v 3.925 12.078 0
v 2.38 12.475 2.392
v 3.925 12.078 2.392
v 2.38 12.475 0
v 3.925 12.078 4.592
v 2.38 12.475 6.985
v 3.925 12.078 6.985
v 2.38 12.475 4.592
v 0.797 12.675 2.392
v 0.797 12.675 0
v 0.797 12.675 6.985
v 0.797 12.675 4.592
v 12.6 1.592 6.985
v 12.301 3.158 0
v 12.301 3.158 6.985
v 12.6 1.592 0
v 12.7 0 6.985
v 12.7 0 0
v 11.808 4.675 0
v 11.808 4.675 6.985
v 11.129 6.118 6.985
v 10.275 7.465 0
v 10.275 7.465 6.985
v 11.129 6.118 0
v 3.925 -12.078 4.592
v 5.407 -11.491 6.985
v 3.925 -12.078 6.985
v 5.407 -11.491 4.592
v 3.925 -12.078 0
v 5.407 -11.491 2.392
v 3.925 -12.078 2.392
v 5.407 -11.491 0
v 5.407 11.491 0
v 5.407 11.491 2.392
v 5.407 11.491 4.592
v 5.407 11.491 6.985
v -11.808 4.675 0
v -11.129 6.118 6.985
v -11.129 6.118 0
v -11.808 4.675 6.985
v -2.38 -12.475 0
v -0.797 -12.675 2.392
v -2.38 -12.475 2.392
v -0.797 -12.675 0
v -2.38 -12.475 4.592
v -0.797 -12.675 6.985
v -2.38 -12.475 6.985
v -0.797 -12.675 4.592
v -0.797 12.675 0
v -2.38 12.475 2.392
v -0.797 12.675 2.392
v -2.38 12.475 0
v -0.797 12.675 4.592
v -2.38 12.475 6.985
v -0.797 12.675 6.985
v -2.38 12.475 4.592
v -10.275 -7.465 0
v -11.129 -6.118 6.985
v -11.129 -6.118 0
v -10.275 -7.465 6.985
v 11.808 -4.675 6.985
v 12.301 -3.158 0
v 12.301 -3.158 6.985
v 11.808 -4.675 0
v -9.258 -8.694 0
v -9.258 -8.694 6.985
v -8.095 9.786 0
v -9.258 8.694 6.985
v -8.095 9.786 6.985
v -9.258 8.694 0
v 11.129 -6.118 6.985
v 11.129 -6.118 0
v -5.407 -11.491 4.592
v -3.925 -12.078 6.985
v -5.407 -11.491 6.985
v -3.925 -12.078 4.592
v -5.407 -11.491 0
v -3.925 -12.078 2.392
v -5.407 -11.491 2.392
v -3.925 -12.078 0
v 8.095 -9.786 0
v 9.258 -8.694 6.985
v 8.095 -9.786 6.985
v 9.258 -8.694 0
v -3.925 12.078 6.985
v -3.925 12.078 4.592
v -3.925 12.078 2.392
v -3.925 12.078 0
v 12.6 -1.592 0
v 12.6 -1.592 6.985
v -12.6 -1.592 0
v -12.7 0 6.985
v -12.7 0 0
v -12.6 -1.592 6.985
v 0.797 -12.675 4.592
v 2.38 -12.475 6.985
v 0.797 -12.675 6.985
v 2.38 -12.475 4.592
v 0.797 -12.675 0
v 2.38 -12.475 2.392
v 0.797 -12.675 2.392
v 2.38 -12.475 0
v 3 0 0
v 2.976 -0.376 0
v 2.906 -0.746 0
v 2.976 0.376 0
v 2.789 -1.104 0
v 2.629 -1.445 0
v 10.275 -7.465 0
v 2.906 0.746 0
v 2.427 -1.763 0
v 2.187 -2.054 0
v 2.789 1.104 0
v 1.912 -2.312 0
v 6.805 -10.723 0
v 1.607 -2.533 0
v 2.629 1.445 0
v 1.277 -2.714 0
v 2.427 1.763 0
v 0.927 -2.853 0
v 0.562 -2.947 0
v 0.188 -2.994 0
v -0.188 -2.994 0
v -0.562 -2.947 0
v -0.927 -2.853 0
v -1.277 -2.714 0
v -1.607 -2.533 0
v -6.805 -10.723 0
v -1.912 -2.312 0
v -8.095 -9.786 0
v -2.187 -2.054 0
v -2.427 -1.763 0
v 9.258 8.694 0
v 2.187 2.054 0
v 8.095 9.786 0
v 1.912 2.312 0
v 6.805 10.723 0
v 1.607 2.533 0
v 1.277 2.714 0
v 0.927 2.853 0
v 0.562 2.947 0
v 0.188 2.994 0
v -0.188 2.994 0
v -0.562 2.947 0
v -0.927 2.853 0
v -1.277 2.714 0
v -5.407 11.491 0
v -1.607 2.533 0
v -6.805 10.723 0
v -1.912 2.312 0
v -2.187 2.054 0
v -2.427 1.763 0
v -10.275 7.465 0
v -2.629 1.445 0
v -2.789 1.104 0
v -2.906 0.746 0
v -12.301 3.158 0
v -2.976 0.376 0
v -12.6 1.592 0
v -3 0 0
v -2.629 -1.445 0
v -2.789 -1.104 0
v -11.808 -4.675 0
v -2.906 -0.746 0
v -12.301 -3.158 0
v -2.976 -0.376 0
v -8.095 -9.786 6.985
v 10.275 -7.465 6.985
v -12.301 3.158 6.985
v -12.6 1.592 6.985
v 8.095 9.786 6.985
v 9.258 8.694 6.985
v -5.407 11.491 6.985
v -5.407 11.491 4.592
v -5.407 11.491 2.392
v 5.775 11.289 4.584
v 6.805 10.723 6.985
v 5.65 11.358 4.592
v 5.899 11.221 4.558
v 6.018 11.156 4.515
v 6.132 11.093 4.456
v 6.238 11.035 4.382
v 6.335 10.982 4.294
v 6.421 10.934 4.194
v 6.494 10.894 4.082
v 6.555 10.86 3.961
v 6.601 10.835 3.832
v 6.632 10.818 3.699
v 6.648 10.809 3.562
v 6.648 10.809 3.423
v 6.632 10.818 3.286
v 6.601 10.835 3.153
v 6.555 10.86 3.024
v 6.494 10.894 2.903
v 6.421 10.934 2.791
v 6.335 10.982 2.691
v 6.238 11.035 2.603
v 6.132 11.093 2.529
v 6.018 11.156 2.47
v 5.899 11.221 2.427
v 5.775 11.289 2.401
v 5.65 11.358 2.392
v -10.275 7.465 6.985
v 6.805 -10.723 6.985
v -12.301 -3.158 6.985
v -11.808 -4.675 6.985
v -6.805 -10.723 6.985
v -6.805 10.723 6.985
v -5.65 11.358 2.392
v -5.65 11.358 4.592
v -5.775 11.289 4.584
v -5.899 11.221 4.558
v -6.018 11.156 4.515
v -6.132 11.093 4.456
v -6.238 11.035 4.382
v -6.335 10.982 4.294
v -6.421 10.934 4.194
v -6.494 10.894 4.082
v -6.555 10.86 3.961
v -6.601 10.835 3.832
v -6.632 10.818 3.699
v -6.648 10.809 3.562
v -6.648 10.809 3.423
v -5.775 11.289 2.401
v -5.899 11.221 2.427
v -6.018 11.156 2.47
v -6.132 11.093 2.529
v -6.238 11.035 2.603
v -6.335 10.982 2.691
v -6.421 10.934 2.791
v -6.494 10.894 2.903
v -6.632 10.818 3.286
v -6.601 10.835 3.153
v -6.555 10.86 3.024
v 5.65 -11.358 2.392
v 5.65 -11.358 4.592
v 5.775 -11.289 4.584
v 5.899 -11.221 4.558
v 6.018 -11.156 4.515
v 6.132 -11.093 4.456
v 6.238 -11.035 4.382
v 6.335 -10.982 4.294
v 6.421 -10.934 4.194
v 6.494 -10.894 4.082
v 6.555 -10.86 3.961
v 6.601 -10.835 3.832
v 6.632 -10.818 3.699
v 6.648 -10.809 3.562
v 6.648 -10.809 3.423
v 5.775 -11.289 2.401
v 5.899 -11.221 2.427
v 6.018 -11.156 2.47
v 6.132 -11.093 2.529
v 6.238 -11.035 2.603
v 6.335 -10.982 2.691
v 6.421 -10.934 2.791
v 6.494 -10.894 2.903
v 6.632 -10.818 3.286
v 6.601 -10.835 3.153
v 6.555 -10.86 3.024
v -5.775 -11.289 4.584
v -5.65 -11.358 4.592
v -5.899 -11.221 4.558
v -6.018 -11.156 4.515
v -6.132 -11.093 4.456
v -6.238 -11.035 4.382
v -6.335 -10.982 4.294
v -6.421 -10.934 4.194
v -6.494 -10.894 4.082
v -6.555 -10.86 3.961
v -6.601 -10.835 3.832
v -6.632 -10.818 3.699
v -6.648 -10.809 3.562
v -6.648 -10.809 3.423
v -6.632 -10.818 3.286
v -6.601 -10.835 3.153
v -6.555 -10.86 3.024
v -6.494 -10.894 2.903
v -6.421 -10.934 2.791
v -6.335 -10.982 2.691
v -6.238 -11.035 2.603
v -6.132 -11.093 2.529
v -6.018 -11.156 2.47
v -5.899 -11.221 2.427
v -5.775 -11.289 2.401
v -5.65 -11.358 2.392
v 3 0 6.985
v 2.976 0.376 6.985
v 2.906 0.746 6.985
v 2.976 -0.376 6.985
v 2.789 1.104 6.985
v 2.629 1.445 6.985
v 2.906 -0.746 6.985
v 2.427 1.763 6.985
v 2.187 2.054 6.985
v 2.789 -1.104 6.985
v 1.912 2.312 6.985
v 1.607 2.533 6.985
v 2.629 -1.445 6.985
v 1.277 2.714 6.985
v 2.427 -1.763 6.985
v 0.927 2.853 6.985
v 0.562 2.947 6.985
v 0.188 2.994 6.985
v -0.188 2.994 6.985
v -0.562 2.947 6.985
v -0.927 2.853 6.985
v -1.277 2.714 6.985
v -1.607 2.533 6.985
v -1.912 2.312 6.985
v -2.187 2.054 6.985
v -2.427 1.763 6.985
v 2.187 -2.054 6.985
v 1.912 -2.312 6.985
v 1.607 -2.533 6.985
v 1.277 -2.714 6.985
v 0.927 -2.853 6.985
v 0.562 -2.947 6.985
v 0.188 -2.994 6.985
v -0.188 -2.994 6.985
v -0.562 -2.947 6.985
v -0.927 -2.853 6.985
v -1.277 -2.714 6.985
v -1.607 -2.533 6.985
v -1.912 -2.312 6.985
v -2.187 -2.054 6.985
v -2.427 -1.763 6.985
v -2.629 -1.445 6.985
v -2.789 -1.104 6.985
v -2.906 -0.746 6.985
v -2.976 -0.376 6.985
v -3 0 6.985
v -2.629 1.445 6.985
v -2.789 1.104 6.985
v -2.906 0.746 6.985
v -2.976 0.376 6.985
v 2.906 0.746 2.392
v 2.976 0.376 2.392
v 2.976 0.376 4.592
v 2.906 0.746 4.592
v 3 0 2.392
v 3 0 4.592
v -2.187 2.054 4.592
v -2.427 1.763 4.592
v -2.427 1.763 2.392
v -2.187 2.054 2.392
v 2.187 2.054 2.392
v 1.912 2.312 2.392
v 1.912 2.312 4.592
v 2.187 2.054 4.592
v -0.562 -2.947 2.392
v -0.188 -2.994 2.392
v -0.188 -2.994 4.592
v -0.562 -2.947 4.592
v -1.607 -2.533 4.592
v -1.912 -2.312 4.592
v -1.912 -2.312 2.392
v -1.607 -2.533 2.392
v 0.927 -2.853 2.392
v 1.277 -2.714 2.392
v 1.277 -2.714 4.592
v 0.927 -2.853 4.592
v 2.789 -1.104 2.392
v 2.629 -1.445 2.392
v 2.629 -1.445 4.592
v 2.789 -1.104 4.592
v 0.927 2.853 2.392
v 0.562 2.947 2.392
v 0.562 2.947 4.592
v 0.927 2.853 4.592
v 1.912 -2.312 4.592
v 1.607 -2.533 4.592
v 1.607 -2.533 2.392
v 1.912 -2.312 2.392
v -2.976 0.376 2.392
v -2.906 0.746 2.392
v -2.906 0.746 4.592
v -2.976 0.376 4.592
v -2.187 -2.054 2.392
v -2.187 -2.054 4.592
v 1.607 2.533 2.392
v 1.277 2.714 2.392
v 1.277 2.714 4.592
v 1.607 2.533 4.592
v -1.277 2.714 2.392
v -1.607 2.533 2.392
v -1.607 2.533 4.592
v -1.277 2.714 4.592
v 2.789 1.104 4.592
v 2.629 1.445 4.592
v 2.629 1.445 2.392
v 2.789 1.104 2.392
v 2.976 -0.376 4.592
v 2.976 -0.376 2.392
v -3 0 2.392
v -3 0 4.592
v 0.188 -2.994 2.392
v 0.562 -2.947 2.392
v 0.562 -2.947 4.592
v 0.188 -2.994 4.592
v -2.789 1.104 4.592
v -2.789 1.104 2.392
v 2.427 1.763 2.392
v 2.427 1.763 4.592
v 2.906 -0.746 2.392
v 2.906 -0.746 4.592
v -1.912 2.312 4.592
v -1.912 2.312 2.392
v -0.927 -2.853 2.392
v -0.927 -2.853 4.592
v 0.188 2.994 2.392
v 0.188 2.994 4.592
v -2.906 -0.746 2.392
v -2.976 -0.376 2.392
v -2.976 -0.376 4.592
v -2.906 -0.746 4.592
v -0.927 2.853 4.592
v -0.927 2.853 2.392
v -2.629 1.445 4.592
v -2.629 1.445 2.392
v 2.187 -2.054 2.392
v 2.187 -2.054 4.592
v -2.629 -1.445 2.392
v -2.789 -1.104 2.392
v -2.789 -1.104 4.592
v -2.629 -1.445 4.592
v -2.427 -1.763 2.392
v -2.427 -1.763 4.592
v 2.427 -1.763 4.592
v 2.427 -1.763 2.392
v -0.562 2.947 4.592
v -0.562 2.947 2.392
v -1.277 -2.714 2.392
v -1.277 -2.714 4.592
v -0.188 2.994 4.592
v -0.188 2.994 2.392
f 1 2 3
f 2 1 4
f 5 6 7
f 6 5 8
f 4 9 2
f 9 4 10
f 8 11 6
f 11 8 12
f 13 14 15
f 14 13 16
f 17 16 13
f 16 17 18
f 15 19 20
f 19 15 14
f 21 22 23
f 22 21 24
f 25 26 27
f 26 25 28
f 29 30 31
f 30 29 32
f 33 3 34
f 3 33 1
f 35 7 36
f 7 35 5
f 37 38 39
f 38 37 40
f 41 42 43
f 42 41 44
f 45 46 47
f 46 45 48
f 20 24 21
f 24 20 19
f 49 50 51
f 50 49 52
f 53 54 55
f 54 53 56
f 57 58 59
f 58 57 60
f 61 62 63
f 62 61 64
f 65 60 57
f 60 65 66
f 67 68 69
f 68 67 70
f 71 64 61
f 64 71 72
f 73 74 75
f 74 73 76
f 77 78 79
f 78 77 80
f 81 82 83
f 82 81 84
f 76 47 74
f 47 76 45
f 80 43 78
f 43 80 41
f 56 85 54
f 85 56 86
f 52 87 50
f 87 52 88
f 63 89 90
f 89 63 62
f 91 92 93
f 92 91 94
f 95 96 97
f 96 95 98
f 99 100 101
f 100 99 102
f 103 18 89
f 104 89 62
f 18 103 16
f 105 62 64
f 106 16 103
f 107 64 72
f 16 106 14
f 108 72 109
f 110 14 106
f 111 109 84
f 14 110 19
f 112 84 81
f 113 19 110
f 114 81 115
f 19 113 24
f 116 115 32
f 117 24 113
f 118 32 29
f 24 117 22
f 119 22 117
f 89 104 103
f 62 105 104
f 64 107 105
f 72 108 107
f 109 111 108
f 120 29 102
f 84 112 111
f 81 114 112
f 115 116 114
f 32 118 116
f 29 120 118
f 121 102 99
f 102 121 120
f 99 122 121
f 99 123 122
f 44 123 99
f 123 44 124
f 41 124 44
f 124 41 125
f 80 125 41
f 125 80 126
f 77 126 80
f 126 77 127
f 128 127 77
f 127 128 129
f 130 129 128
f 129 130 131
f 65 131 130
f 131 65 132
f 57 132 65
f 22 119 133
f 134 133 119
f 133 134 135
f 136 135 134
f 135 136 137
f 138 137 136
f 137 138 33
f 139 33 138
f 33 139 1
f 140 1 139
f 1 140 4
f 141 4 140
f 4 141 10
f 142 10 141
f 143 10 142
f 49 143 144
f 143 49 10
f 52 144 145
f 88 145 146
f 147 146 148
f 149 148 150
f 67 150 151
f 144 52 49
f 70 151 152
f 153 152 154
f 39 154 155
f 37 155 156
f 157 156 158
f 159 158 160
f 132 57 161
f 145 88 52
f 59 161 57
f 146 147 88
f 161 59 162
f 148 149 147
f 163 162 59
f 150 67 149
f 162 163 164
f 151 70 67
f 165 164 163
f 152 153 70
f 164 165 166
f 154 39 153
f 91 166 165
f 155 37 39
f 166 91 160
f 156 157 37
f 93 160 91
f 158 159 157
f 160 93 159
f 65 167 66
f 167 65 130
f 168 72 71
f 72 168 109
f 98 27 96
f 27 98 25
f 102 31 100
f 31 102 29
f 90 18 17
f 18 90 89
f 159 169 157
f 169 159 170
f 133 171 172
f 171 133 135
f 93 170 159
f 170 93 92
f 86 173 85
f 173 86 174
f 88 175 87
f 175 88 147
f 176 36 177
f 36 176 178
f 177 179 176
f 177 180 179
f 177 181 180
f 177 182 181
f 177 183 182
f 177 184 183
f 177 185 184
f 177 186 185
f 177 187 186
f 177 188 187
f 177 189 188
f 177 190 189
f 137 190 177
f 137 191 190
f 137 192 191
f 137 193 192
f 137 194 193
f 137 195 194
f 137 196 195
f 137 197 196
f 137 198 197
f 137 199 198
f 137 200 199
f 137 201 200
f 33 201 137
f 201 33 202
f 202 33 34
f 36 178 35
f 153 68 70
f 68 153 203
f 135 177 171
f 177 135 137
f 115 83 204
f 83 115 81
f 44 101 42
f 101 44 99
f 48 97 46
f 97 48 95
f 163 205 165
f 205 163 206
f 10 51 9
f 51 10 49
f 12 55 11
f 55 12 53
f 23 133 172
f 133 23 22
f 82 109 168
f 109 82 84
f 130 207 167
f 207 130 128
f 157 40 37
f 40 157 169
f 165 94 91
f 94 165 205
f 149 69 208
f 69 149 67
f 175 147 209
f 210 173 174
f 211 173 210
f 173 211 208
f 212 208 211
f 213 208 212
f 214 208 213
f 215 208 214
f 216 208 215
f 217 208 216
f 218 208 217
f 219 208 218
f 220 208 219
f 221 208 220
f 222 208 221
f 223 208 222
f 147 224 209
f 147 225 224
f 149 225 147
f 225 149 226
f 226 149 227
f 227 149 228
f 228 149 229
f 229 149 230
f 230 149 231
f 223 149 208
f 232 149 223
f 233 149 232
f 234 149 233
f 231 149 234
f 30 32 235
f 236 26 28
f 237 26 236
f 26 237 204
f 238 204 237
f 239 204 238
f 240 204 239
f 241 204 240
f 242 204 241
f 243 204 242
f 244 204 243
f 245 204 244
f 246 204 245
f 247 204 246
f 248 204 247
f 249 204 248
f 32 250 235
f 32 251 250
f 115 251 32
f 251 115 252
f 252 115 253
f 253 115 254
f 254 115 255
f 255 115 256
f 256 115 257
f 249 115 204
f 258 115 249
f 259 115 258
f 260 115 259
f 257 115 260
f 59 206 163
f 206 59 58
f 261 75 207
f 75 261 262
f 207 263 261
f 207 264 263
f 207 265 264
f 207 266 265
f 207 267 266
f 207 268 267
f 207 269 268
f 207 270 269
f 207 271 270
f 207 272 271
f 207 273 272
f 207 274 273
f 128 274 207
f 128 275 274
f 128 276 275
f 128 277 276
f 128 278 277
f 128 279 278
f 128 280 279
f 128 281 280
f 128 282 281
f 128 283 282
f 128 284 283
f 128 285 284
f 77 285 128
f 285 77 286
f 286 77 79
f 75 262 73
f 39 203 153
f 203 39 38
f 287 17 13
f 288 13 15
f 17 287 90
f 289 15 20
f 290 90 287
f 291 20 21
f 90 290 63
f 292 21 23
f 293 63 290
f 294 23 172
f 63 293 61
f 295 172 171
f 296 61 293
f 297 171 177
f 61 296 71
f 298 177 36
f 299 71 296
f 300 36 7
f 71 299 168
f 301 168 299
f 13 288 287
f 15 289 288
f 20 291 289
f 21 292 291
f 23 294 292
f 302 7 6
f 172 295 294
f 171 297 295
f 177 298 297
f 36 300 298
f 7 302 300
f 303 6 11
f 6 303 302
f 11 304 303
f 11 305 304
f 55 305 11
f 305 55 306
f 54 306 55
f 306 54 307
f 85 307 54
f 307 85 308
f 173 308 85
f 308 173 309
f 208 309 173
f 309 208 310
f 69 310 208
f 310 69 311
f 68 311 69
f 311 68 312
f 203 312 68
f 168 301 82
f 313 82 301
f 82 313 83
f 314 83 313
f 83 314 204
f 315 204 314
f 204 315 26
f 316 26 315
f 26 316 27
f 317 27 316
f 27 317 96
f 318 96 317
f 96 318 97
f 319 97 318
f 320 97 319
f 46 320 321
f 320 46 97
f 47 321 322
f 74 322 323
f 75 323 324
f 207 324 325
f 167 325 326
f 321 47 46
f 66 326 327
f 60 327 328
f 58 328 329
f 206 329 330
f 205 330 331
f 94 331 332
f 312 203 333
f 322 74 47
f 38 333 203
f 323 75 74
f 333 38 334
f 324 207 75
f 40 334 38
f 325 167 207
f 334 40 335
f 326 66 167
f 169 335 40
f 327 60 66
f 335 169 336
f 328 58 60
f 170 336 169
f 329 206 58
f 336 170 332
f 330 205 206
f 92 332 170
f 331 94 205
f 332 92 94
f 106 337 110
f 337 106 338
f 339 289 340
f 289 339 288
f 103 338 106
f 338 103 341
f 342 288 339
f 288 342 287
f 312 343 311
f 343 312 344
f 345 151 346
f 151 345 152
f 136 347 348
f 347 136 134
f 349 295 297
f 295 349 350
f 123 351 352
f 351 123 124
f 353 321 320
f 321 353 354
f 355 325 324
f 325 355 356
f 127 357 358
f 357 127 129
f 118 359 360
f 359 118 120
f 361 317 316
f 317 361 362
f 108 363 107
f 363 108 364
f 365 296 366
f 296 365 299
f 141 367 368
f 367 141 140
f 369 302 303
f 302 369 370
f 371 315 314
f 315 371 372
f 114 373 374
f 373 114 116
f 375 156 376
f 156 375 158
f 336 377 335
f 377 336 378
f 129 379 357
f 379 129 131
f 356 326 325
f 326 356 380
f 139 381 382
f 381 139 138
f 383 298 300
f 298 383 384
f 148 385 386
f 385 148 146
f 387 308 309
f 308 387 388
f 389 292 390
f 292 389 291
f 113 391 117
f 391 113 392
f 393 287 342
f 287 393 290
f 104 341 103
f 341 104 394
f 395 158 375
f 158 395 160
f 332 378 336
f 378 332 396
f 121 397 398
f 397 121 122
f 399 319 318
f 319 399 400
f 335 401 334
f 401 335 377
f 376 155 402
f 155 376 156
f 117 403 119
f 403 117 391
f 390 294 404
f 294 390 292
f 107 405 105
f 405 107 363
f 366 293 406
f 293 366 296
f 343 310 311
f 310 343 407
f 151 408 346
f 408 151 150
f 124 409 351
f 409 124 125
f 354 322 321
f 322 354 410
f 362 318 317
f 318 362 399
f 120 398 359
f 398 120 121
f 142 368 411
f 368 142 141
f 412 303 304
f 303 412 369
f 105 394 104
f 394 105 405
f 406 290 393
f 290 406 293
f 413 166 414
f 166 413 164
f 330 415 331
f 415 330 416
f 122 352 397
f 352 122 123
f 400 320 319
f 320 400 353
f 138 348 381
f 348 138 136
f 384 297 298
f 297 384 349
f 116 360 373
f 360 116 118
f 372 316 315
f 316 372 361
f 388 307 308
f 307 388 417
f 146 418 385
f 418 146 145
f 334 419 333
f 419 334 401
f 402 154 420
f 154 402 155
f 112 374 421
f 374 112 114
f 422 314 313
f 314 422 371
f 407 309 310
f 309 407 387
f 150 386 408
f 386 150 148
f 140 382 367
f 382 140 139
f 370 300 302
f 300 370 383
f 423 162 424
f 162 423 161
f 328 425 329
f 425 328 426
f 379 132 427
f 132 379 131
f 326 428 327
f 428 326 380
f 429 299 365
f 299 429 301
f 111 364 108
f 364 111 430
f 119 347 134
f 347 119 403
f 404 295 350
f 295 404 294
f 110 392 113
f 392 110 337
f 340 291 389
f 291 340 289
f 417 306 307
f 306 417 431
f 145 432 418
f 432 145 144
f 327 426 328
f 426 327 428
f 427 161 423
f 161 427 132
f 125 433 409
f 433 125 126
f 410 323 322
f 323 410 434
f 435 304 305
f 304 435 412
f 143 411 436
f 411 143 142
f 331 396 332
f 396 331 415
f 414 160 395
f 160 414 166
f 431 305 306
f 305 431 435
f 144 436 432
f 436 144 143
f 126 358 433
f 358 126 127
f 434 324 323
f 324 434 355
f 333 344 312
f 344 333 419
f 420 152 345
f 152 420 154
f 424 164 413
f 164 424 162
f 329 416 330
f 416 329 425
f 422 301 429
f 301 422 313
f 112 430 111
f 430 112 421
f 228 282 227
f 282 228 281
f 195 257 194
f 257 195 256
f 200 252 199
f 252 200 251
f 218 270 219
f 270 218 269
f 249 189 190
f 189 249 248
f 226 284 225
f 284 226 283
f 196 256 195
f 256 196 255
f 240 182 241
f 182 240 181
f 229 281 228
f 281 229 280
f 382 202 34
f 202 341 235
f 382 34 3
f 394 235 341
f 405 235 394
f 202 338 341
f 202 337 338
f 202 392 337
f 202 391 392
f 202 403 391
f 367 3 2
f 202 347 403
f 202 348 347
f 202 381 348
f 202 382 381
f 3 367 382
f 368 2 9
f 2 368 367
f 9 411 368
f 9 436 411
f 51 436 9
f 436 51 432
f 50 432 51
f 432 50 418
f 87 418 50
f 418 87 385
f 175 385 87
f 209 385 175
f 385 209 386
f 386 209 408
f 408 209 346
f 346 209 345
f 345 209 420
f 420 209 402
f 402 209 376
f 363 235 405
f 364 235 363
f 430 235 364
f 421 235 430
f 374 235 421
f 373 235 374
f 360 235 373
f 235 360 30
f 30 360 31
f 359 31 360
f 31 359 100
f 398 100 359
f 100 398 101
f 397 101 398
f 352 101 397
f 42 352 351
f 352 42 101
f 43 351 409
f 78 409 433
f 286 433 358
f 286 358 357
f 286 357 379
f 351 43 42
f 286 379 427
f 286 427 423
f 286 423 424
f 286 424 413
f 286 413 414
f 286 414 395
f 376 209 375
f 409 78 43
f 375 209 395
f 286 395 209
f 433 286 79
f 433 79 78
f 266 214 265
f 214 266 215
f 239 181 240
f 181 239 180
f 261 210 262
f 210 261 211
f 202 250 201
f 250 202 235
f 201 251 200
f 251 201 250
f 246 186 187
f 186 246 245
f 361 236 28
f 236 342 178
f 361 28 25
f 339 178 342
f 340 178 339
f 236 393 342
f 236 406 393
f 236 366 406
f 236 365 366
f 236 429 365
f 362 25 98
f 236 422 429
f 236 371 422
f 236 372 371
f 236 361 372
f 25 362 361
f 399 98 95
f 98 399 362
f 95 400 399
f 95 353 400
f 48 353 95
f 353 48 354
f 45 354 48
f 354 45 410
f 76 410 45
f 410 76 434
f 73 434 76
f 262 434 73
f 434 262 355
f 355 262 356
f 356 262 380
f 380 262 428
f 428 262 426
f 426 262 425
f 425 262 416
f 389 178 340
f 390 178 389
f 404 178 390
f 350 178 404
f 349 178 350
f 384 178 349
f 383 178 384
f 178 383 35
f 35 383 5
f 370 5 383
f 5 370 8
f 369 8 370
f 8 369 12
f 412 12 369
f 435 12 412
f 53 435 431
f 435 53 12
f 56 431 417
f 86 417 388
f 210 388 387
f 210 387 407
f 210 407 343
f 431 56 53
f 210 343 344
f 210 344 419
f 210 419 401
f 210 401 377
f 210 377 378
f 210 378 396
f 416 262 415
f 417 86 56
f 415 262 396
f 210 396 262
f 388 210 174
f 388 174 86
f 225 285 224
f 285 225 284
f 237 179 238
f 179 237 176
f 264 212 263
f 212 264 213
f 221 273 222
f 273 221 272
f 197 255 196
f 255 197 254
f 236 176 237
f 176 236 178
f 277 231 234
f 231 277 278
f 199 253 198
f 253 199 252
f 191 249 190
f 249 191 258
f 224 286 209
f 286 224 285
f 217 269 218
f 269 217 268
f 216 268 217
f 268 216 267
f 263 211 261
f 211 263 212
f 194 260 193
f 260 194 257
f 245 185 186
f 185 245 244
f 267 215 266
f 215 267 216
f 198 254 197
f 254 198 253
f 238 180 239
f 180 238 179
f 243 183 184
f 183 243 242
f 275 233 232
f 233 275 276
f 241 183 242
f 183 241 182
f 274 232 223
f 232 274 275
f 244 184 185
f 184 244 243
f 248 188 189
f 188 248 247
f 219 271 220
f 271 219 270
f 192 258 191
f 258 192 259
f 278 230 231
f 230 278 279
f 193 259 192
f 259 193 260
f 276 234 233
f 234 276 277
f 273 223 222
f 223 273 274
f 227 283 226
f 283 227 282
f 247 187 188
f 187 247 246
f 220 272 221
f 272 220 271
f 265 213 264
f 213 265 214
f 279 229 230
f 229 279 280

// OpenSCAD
D=4.5*25.4;//mm
Wall=2;//mm
DMount=22.5;//mmr
RBolt=22;//mm
DBolt=3.5;//mm
DSeed=10;//mm
PipeID=.75*25.4;//mm
curveRes = 50;

module wireLoop(up=5,LoopDiameter=7/*mm*/,WireDiameter=2/*mm*/) {
N=16;
C=LoopDiameter*PI;
H=C*1.2/N;
    hull() {
      translate([-up,(LoopDiameter-WireDiameter)/2,0])
        cylinder(d=WireDiameter,h=30,$fn=curveRes,center=true);
      translate([-up,-(LoopDiameter-WireDiameter)/2,0])
        cylinder(d=WireDiameter,h=30,$fn=curveRes,center=true);
    }
}

module setScrew() {
    AxleD=19;//mm
    boltD=4;//mm
    boltFlat=9;//mm
    boltNutT=4;//mm
    boltHoleT=12;//mm
    MotorAxleD=25.4*5/16;//mm
    MotorAxleT=25.4*19/32;//mm
     translate([0,MotorAxleD/2+boltNutT/2,-AxleD/3]){
            cube([boltFlat,boltNutT,boltFlat*1.4],center=true);
            translate([0,AxleD/4,0])  
              rotate([90,0,0])
                cylinder(d=boltD,h=AxleD/2,center=true,$fn=curveRes);
     }  
}

 module wireWheel(){
  H=25.4*5/8;
  difference(){  
      cylinder(d=22.4,h=H,$fn=curveRes);
    translate([0,0,-.5])  
      cylinder(h=H+1,d=8+.5,$fn=curveRes);
    translate([0,-.95,12])  
          setScrew();
  }
}

module potAttach(outerDiameter=25.4, innerDiameter=25.4*7/32+.5) {
  H=25.4*1/4;
  difference(){  
    cylinder(d=outerDiameter,h=H,$fn=curveRes); 
    #cylinder(h=H,d=innerDiameter,$fn=curveRes);
  }
}

module potSide(includeRod = true, outerDiameter=25.4, innerDiameter=25.4*7/32+.5) {
  difference() {
    potAttach(outerDiameter, innerDiameter); 
    if(includeRod){
        rotate([90,90,0]) 
            wireLoop(up=25.4*2/16,LoopDiameter=13.3);
    }
  }
}
module motorSide() {
  difference() {
    wireWheel();
    translate([0,0,3])
    rotate([90,90,90]) 
      wireLoop(up=25.4*5/8/2,LoopDiameter=13.3);
  }
}


module glassSlide() {
Offset=12;
Width=20;
Wall=3;
boltD=4;
resize=1.2;

difference() {
  translate([0,0,Offset/2])
    cube([Wall,Width,Offset*1.25],center=true);
  rotate([0,90+15,0])
    scale([resize,resize,resize])
      wireLoop(up=Offset*.65,LoopDiameter=13.3,WireDiameter=3);
}

translate([-Offset/2-Wall/2,0,0])
  difference() {
    rotate([0,90,0])
      cube([Wall,Width,Offset*1.25],center=true);
    translate([0,Width/4,0])  
      cylinder(d=boltD,h=Wall+.5,center=true,$fn=curveRes);  
    translate([0,-Width/4,0])  
      cylinder(d=boltD,h=Wall+.5,center=true,$fn=curveRes);  
  }
}
module potentiometerMotorMount(){
potSide(false, outerDiameter=22.4);
translate([0, 0, (25.4*5/8) +(25.4*1/4)]) 
    rotate([180,0,0])
        motorSide();    
}
//glassSlide();
//potentiometerMotorMount();
//translate([0,30,0])
scale([1,1,1.1])
potSide(innerDiameter = 6);
//potAttach();
